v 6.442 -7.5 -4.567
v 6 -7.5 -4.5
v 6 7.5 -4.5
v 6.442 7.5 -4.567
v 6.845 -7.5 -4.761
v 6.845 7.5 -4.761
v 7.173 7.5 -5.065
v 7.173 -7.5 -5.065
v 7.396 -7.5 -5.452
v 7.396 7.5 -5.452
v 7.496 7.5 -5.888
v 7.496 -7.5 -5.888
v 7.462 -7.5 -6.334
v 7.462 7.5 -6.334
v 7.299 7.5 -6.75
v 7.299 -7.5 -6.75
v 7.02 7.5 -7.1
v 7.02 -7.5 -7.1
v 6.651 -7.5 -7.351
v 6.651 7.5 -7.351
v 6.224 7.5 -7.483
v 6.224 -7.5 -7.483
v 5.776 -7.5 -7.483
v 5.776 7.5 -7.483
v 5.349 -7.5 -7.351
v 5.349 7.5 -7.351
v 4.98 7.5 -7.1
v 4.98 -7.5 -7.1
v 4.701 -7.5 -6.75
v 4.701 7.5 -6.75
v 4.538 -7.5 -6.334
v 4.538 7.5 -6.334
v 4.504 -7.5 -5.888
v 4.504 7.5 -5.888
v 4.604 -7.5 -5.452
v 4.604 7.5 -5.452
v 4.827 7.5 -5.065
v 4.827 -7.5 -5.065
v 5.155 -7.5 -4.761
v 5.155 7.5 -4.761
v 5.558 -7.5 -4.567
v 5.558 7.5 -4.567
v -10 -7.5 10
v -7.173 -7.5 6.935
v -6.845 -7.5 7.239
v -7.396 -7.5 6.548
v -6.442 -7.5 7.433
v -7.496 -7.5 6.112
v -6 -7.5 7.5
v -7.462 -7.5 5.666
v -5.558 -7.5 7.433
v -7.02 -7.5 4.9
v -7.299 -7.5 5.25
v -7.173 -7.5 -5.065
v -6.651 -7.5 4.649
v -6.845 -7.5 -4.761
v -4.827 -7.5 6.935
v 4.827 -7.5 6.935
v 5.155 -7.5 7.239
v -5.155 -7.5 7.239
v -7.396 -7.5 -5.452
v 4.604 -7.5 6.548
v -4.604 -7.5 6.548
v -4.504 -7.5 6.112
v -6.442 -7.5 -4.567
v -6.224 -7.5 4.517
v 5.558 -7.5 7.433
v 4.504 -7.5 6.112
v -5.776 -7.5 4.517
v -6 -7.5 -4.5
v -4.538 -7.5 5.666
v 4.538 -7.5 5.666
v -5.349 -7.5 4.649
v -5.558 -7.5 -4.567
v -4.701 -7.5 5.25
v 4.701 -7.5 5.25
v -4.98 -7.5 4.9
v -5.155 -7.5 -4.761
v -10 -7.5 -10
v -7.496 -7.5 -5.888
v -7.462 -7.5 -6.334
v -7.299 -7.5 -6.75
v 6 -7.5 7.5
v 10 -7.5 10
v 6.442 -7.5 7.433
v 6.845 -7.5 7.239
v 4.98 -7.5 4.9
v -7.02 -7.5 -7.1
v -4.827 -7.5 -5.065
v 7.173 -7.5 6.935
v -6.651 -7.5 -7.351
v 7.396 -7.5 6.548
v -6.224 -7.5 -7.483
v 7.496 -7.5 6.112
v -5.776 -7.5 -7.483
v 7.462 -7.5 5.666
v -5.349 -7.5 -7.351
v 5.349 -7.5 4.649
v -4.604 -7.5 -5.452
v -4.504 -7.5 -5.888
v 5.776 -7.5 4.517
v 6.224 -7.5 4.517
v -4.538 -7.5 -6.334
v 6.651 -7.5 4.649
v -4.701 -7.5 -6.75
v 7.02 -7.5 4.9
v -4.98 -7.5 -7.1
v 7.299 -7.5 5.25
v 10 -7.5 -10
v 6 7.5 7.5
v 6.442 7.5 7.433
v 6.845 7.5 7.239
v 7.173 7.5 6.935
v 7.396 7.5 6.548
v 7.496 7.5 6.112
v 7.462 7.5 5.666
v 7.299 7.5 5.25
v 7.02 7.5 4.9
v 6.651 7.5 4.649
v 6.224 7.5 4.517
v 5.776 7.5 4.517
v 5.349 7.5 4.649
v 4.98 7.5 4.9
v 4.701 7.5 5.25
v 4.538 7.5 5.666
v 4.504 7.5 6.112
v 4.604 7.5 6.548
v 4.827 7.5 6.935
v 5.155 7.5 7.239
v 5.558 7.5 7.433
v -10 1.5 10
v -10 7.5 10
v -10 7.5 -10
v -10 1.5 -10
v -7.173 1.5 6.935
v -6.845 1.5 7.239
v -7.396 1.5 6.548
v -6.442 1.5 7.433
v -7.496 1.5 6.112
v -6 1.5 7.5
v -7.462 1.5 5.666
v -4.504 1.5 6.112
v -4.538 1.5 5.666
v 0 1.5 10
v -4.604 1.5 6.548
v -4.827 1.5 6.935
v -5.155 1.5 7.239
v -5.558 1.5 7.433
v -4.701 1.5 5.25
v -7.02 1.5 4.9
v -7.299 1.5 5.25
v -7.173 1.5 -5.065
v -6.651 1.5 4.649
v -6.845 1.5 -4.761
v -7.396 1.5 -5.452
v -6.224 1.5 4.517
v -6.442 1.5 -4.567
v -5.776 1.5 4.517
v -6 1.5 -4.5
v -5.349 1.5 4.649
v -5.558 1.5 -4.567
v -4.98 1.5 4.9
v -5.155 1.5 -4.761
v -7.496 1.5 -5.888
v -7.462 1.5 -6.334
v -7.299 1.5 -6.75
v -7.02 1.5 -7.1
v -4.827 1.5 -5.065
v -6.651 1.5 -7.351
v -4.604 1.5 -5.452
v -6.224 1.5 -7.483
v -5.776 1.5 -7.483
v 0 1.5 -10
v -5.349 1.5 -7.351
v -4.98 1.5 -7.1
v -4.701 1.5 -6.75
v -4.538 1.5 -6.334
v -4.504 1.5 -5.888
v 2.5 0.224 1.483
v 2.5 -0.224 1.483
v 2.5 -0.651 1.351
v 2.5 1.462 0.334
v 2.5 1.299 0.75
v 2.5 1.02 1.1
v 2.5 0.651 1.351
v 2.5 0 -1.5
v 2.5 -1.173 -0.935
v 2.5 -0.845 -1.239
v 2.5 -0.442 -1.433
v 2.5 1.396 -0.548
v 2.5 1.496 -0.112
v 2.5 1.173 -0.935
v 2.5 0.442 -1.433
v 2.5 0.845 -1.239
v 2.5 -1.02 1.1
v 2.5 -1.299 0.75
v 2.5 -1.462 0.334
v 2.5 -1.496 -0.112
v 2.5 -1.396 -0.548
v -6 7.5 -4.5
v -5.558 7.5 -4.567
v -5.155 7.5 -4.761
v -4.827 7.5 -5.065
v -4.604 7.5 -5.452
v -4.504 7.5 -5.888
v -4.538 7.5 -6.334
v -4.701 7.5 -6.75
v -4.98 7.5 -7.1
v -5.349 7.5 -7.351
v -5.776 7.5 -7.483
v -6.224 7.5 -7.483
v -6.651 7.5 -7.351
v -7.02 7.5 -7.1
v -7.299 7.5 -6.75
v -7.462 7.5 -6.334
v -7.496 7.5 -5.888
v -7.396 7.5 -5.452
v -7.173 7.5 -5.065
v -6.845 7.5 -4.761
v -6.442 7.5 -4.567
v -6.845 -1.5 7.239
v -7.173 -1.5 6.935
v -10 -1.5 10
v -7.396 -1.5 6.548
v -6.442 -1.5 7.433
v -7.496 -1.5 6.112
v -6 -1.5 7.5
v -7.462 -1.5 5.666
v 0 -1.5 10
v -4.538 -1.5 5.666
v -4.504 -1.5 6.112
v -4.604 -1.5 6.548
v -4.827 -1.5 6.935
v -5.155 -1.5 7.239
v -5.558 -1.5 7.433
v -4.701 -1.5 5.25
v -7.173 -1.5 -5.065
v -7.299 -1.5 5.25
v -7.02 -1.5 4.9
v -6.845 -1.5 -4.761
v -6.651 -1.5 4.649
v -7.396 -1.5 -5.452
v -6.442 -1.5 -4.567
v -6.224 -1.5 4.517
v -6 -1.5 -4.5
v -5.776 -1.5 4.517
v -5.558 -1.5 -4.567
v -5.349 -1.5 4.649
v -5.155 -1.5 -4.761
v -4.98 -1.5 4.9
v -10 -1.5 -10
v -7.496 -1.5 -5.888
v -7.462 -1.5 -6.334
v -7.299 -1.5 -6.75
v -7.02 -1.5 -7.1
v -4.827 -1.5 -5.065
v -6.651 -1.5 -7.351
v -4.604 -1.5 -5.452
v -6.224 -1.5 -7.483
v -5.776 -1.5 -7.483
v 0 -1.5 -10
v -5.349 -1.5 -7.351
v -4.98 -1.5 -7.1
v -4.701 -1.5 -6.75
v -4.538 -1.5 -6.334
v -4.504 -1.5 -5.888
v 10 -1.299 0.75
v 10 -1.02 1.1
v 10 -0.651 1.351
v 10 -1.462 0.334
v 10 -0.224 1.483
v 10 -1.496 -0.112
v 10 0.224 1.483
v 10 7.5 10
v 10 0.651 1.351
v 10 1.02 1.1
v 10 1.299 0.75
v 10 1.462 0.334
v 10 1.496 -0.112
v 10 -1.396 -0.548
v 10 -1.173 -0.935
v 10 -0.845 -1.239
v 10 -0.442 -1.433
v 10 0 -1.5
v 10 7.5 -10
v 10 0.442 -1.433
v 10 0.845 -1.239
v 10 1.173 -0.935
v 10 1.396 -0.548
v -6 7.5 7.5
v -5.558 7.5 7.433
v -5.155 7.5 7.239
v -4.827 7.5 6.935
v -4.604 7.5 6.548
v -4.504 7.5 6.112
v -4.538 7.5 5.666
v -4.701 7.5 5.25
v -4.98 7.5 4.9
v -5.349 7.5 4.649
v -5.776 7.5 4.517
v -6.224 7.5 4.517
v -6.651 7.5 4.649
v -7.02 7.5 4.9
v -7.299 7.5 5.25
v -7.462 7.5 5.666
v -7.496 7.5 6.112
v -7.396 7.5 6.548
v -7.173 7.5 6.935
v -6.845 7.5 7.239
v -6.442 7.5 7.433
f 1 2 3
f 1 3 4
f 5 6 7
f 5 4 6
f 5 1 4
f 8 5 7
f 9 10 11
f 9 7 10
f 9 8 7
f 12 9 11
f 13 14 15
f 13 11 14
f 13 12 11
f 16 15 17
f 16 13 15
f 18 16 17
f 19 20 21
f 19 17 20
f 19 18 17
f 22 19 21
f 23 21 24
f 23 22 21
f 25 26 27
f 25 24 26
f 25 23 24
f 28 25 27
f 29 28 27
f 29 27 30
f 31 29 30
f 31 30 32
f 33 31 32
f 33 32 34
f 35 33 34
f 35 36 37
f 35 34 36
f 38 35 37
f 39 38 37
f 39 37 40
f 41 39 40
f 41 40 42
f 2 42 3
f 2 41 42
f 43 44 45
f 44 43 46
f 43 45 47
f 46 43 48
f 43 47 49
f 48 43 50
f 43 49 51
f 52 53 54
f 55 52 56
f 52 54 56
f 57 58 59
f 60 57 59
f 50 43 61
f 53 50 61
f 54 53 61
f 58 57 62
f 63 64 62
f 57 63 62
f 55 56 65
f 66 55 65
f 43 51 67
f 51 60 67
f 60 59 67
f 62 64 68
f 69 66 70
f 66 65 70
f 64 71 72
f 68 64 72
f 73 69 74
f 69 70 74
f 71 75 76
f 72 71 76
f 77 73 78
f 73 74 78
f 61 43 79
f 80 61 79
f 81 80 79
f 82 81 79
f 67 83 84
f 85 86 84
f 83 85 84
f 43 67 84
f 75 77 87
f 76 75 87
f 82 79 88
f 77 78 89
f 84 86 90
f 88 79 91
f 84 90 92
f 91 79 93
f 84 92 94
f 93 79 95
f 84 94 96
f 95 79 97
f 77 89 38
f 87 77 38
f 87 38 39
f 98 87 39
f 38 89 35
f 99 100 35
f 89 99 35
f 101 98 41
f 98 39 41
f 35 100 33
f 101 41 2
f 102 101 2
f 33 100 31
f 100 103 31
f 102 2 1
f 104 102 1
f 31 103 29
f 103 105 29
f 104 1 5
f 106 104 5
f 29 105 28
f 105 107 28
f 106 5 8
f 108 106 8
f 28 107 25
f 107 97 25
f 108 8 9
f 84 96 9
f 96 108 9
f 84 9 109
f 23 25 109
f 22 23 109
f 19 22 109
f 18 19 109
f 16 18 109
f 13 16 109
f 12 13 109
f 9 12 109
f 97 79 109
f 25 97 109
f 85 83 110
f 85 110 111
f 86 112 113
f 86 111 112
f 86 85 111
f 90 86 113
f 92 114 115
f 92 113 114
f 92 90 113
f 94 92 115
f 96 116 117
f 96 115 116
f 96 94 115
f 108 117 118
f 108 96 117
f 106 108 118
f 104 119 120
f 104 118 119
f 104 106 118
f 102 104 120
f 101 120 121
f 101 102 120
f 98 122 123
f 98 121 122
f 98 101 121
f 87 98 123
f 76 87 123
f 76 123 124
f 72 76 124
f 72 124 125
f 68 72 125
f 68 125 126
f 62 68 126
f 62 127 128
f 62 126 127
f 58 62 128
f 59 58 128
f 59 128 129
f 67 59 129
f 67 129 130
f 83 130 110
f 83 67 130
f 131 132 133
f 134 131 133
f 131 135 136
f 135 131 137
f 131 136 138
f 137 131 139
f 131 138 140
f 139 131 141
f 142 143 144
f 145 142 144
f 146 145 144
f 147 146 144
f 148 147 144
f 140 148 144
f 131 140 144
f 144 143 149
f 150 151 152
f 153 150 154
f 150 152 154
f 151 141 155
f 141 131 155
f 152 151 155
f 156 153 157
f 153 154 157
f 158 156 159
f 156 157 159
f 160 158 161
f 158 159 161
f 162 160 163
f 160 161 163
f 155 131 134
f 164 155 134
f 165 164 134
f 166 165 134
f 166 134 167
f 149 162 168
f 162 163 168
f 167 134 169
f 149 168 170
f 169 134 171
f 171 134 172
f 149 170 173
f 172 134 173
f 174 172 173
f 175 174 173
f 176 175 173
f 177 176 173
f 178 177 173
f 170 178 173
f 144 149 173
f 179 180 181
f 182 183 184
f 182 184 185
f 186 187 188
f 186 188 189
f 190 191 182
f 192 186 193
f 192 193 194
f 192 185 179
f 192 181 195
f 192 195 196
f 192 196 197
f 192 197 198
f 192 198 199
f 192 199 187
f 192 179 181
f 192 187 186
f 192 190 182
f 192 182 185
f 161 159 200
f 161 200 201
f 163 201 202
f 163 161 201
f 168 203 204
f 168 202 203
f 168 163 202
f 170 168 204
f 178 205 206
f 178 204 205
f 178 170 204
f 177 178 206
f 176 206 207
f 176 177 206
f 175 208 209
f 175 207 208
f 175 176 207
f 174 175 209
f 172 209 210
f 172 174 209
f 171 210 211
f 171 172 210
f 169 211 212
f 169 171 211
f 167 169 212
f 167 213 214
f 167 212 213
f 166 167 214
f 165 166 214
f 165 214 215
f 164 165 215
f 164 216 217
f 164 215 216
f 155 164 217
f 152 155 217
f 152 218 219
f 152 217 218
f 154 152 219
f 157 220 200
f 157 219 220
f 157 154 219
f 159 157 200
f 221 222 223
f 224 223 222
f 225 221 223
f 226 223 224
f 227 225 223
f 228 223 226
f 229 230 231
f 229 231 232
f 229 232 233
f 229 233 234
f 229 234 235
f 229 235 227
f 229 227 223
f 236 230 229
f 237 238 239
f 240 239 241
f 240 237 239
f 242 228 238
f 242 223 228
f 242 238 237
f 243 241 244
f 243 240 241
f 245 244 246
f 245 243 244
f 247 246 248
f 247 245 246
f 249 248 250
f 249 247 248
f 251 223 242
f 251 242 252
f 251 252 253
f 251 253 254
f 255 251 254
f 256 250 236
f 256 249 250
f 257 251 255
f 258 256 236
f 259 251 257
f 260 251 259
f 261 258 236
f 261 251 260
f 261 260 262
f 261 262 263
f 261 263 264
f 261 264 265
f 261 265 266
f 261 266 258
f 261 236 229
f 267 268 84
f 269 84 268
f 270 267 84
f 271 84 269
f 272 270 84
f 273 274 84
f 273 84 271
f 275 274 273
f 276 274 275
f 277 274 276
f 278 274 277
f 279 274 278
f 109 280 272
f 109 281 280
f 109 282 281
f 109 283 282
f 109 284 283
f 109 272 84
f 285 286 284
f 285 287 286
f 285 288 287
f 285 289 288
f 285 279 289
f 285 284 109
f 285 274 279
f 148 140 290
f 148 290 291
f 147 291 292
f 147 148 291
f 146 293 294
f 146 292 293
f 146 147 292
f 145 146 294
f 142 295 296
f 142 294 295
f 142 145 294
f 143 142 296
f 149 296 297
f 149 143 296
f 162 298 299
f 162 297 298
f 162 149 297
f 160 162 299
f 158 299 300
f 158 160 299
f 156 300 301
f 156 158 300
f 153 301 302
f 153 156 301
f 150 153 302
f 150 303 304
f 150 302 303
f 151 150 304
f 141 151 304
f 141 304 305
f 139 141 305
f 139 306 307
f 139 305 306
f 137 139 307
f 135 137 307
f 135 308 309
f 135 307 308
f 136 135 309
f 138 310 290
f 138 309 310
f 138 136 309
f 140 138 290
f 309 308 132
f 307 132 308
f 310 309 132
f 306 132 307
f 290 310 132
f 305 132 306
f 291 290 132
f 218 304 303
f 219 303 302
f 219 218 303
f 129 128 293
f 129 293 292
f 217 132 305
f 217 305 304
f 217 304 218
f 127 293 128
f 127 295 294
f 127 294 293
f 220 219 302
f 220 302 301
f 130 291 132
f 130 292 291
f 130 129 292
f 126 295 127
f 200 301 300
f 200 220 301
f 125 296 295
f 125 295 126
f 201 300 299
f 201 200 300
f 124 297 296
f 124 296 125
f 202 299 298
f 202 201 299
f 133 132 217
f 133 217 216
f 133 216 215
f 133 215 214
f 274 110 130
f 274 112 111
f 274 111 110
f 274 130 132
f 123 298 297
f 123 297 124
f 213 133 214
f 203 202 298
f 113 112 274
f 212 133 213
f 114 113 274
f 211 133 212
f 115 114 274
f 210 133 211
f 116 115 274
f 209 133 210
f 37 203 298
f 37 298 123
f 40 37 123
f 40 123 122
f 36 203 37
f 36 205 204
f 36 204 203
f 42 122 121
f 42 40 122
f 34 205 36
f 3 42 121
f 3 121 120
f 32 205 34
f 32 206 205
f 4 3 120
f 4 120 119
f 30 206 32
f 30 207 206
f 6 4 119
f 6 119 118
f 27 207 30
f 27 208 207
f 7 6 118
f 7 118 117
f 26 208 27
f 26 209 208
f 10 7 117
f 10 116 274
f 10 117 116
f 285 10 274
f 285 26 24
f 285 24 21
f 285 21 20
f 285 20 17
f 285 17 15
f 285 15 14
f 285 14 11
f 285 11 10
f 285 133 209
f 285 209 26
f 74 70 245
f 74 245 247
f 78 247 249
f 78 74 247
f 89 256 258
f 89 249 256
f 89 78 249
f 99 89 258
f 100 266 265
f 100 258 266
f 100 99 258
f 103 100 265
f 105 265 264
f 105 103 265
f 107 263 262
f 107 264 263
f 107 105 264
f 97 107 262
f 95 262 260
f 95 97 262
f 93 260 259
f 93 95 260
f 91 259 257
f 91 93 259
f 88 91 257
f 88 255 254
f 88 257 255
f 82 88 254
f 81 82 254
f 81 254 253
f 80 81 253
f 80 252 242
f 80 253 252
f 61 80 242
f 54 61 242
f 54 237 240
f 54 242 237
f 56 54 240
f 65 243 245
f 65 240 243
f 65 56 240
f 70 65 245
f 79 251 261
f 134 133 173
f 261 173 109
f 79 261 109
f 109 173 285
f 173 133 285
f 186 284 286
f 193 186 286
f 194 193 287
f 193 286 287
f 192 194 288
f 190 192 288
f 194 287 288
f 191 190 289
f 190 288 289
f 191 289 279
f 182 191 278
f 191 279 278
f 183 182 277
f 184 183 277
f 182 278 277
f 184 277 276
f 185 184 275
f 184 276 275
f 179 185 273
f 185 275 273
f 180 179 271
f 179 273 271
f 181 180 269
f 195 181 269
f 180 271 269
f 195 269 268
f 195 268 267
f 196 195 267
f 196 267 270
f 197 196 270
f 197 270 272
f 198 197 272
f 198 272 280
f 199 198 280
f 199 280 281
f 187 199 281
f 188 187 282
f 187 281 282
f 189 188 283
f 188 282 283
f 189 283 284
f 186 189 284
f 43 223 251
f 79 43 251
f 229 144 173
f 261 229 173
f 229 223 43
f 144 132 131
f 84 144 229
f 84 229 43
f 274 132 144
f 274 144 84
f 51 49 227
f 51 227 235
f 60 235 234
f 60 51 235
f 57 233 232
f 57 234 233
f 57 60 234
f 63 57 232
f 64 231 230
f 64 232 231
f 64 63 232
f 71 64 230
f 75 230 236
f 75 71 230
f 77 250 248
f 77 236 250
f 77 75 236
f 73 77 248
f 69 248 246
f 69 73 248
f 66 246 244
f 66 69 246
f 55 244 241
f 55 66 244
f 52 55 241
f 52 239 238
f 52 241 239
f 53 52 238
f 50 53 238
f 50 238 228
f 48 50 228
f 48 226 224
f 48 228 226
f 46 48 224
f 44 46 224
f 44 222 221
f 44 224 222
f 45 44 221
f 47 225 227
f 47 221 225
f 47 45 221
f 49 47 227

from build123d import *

# Parameters (mm, degrees)
SKETCH1_W               = 20
SKETCH1_H               = 20
BOSS_EXTRUDE1_DEPTH     = 7.5
SKETCH1_3_W             = 20
SKETCH1_3_H             = 20
CUT_EXTRUDE2_DEPTH      = 1.5
SKETCH3_W               = 10
SKETCH3_H               = 20
BOSS_EXTRUDE2_DEPTH     = 1.5
SKETCH4_R               = 1.5
CUT_EXTRUDE3_DEPTH      = 7.5
CUT_EXTRUDE4_DEPTH      = 17.007810594
CUT_EXTRUDE4_DEPTH_BACK = 17.007810594
SKETCH5_R               = 1.5


with BuildPart() as part:
    # Sketch1 → Boss-Extrude1 (new, symmetric)
    with BuildSketch(Plane(origin=(0, 0, 0), x_dir=(1, 0, 0), z_dir=(0, 1, 0))):
        Rectangle(SKETCH1_W, SKETCH1_H)
    extrude(amount=BOSS_EXTRUDE1_DEPTH, both=True)

    # Sketch1<3> → Cut-Extrude2 (cut, symmetric)
    with BuildSketch(Plane(origin=(0, 0, 0), x_dir=(1, 0, 0), z_dir=(0, 1, 0))):
        Rectangle(SKETCH1_3_W, SKETCH1_3_H)
    extrude(amount=CUT_EXTRUDE2_DEPTH, both=True, mode=Mode.SUBTRACT)


with BuildPart() as cut_extrude2_piece_1:
    # of the separate pieces the step leaves, piece 1, a body of its own (cut_extrude2_pieces)
    add(part.part.solids().sort_by_distance((-10, -7.5, -10))[0])



with BuildPart() as cut_extrude2_piece_2:
    # of the separate pieces the step leaves, piece 2, a body of its own (cut_extrude2_pieces)
    add(part.part.solids().sort_by_distance((-10, 1.5, -10))[0])


with BuildPart() as cut_extrude2_piece_1_1:
    add(cut_extrude2_piece_1.part)

    add(cut_extrude2_piece_2.part)  # Boss-Extrude2 merges Cut-Extrude2 piece 2
    # Sketch3 → Boss-Extrude2 (add, symmetric)
    with BuildSketch(Plane(origin=(0, 0, 0), x_dir=(1, 0, 0), z_dir=(0, 1, 0))):
        with Locations((5, 0)):
            Rectangle(SKETCH3_W, SKETCH3_H)
    extrude(amount=BOSS_EXTRUDE2_DEPTH, both=True)

    # Sketch4 → Cut-Extrude3 (cut)
    with BuildSketch(Plane(origin=(10, 0, 0), x_dir=(0, 0, -1), z_dir=(1, 0, 0))):
        Circle(SKETCH4_R)
    extrude(amount=-CUT_EXTRUDE3_DEPTH, mode=Mode.SUBTRACT)

    # Sketch5 → Cut-Extrude4 (cut, two sides: drawn at the far end of the back side and taken through both)
    with BuildSketch(Plane(origin=(0, 0, 0), x_dir=(1, 0, 0), z_dir=(0, 1, 0)).offset(-CUT_EXTRUDE4_DEPTH_BACK)):
        with Locations((-6, 6)):
            Circle(SKETCH5_R)
        with Locations((6, 6)):
            Circle(SKETCH5_R)
        with Locations((6, -6)):
            Circle(SKETCH5_R)
        with Locations((-6, -6)):
            Circle(SKETCH5_R)
    extrude(amount=CUT_EXTRUDE4_DEPTH + CUT_EXTRUDE4_DEPTH_BACK, mode=Mode.SUBTRACT)


solid = cut_extrude2_piece_1_1.part
